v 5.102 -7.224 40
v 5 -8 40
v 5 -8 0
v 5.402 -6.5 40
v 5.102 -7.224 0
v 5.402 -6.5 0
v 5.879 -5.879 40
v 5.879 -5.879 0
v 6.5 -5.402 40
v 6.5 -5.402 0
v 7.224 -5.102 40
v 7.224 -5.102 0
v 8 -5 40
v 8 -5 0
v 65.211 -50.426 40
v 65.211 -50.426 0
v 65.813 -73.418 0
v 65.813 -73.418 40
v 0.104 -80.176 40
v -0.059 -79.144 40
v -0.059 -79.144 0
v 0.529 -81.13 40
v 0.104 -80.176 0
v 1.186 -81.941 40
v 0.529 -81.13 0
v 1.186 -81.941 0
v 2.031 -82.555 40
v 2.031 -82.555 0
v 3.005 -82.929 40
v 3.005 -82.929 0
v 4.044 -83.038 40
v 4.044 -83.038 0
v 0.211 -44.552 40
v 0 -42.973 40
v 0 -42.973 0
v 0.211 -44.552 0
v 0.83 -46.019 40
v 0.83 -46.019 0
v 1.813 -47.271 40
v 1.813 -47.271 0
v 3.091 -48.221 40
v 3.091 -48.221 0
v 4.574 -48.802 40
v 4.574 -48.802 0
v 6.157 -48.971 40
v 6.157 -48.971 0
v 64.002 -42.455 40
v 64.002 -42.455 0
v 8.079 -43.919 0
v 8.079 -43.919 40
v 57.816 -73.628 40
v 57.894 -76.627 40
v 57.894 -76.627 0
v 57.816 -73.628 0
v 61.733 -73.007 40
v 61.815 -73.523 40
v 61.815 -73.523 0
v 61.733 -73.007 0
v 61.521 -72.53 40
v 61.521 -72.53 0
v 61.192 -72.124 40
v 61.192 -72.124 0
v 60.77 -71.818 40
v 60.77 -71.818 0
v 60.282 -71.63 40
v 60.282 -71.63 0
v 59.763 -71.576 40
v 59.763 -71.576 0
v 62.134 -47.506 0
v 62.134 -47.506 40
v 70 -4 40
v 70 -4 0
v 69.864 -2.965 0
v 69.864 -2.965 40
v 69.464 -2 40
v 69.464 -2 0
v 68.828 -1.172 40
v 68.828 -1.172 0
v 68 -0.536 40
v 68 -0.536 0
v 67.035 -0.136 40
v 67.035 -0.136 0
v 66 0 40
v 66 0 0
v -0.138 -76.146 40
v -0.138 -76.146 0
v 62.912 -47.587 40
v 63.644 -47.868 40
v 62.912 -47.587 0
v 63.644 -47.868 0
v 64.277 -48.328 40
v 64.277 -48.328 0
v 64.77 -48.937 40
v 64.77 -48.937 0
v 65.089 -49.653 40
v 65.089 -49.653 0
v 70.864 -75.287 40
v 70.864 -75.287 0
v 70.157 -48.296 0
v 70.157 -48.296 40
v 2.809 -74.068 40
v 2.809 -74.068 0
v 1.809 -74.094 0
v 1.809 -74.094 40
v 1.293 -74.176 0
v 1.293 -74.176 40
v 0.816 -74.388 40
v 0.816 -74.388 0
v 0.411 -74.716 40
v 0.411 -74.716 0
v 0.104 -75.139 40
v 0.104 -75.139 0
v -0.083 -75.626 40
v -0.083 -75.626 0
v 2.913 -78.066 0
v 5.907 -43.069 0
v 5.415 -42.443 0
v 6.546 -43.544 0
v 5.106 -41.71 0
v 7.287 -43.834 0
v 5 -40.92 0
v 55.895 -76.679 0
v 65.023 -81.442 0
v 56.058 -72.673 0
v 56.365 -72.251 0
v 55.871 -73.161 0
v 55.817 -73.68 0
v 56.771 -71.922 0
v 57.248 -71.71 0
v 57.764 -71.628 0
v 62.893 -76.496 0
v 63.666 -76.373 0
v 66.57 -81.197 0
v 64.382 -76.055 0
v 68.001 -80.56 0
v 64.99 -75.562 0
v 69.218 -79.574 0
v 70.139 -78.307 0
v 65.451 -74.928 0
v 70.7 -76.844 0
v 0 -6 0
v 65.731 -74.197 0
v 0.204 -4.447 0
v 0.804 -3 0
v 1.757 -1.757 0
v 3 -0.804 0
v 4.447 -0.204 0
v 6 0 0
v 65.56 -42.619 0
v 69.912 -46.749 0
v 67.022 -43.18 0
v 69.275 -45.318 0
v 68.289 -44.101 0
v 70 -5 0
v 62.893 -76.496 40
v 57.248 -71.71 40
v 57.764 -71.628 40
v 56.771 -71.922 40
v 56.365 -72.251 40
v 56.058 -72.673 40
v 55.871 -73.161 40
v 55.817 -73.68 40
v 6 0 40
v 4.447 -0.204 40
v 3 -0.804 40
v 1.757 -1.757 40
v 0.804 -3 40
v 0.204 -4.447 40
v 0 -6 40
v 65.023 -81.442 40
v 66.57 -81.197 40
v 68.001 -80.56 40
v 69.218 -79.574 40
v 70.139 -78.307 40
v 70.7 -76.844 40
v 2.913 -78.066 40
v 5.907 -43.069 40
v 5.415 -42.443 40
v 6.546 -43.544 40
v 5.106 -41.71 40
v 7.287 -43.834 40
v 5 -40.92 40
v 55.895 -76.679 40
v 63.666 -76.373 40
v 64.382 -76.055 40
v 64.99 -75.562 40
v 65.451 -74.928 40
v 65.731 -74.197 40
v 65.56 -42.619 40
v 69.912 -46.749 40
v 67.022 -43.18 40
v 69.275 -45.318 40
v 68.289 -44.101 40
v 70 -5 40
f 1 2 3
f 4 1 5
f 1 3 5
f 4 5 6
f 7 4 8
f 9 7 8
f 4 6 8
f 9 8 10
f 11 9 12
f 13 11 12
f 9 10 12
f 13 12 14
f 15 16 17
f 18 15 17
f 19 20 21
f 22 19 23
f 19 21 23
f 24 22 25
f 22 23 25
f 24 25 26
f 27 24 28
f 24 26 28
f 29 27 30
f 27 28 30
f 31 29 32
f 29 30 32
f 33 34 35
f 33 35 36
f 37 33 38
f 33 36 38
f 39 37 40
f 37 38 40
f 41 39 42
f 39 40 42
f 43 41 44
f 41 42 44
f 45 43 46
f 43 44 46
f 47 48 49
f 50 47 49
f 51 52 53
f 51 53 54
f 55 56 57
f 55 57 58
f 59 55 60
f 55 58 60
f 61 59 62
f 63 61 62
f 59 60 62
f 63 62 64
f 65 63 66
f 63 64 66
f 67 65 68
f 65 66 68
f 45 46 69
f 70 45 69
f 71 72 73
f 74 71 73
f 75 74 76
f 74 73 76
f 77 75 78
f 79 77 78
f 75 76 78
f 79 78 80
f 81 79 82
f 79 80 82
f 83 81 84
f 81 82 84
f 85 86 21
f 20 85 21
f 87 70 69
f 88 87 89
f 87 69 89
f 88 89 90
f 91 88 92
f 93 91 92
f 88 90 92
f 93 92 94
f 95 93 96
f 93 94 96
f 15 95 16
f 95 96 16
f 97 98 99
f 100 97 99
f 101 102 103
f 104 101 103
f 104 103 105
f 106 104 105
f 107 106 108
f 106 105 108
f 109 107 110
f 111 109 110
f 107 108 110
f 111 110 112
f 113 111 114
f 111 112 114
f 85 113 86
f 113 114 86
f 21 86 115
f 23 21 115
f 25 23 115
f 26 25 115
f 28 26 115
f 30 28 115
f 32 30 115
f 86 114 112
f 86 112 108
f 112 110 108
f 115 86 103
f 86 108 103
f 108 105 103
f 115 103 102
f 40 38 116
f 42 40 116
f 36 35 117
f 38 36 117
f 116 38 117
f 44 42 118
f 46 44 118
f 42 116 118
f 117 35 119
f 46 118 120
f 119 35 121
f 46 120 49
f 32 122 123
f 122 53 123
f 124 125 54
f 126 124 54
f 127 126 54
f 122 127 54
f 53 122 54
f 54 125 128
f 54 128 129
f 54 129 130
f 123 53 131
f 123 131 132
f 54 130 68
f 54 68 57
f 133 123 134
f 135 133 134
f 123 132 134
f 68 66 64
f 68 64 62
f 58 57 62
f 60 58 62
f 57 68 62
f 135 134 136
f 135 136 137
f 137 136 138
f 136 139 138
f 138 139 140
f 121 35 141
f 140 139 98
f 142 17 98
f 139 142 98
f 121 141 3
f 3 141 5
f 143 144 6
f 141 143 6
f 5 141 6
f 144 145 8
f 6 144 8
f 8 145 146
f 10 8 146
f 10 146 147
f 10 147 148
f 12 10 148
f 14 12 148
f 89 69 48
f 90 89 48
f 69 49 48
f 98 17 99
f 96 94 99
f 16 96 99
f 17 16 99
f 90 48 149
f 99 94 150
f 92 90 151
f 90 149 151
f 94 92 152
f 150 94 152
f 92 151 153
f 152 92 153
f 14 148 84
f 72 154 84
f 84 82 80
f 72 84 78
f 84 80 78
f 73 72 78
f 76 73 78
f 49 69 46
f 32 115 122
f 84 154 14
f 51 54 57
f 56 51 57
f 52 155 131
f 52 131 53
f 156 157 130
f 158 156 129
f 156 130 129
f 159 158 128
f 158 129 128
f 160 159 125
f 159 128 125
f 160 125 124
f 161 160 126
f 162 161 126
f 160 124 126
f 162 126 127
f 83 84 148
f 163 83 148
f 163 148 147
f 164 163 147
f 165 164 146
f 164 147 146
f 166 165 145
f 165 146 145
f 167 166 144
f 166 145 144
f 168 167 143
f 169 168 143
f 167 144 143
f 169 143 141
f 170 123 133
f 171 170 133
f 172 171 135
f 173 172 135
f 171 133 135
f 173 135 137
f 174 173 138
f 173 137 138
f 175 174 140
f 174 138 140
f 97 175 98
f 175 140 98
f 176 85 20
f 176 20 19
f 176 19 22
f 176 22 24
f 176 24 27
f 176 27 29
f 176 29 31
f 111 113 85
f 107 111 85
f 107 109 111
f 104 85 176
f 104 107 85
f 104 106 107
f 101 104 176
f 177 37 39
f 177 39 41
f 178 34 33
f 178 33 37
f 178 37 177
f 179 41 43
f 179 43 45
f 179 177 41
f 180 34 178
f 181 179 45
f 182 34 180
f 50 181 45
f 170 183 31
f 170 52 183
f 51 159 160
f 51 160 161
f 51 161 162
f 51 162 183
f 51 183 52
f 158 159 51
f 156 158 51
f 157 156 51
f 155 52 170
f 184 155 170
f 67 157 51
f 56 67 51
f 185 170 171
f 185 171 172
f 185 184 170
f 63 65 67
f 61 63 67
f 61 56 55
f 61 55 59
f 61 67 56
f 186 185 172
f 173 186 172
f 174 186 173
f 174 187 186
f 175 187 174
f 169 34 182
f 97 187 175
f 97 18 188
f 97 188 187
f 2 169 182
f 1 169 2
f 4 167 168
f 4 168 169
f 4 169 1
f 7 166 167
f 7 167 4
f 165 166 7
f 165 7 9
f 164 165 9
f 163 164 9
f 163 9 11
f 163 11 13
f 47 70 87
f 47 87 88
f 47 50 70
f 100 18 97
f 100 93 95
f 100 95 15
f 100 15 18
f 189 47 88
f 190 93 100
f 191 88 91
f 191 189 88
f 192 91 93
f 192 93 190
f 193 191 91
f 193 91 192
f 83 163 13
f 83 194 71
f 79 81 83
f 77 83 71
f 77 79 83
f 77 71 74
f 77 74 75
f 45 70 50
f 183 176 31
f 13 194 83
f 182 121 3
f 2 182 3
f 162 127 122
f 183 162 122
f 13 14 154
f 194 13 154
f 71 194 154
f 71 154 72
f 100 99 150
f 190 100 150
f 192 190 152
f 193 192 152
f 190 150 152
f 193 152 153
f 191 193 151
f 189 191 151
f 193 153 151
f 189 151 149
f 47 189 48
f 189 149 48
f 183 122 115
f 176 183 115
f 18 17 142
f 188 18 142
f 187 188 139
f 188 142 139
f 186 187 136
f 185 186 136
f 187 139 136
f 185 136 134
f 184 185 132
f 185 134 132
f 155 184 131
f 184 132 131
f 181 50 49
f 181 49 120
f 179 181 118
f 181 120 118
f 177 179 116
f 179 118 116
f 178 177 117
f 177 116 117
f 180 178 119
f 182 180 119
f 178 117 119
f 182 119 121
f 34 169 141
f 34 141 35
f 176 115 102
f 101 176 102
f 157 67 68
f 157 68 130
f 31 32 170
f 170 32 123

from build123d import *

# Parameters (mm, degrees)
F1_DEPTH = 40


with BuildPart() as f1:
    # F0 (on Top) → F1 (new body)
    with BuildSketch(Plane.XY):
        with BuildLine():
            Line((66, 0), (6, 0))
            ThreePointArc((6, 0), (1.757359, -1.757359), (0, -6))
            Line((0, -6), (0, -42.973471))
            ThreePointArc((0, -42.973471), (1.813257, -47.271283), (6.157062, -48.971415))
            Line((6.157062, -48.971415), (62.133626, -47.505617))
            ThreePointArc((62.133626, -47.505617), (64.277221, -48.328466), (65.211129, -50.426058))
            Line((65.211129, -50.426058), (65.813199, -73.418177))
            ThreePointArc((65.813199, -73.418177), (64.99035, -75.561771), (62.892758, -76.49568))
            Line((62.892758, -76.49568), (57.894471, -76.626564))
            Line((57.894471, -76.626564), (57.81594, -73.627593))
            Line((57.81594, -73.627593), (61.814569, -73.522885))
            ThreePointArc((61.814569, -73.522885), (61.191964, -72.12449), (59.762901, -71.575924))
            Line((59.762901, -71.575924), (57.763586, -71.628278))
            ThreePointArc((57.763586, -71.628278), (56.365191, -72.250883), (55.816626, -73.679946))
            Line((55.816626, -73.679946), (55.895156, -76.678918))
            Line((55.895156, -76.678918), (2.913318, -78.066297))
            Line((2.913318, -78.066297), (2.80861, -74.067667))
            Line((2.80861, -74.067667), (1.808953, -74.093844))
            ThreePointArc((1.808953, -74.093844), (0.410558, -74.71645), (-0.138008, -76.145513))
            Line((-0.138008, -76.145513), (-0.059477, -79.144485))
            ThreePointArc((-0.059477, -79.144485), (1.185734, -81.941274), (4.04386, -83.038406))
            Line((4.04386, -83.038406), (65.022957, -81.441612))
            ThreePointArc((65.022957, -81.441612), (69.218142, -79.573796), (70.863839, -75.286607))
            Line((70.863839, -75.286607), (70.157062, -48.295859))
            ThreePointArc((70.157062, -48.295859), (68.289245, -44.100675), (64.002056, -42.454977))
            Line((64.002056, -42.454977), (8.078531, -43.919386))
            ThreePointArc((8.078531, -43.919386), (5.906629, -43.06932), (5, -40.920414))
            Line((5, -40.920414), (5, -8))
            ThreePointArc((5, -8), (5.87868, -5.87868), (8, -5))
            Line((8, -5), (70, -5))
            Line((70, -5), (70, -4))
            ThreePointArc((70, -4), (68.828427, -1.171573), (66, 0))
        make_face()
    extrude(amount=F1_DEPTH)


solid = f1.part
